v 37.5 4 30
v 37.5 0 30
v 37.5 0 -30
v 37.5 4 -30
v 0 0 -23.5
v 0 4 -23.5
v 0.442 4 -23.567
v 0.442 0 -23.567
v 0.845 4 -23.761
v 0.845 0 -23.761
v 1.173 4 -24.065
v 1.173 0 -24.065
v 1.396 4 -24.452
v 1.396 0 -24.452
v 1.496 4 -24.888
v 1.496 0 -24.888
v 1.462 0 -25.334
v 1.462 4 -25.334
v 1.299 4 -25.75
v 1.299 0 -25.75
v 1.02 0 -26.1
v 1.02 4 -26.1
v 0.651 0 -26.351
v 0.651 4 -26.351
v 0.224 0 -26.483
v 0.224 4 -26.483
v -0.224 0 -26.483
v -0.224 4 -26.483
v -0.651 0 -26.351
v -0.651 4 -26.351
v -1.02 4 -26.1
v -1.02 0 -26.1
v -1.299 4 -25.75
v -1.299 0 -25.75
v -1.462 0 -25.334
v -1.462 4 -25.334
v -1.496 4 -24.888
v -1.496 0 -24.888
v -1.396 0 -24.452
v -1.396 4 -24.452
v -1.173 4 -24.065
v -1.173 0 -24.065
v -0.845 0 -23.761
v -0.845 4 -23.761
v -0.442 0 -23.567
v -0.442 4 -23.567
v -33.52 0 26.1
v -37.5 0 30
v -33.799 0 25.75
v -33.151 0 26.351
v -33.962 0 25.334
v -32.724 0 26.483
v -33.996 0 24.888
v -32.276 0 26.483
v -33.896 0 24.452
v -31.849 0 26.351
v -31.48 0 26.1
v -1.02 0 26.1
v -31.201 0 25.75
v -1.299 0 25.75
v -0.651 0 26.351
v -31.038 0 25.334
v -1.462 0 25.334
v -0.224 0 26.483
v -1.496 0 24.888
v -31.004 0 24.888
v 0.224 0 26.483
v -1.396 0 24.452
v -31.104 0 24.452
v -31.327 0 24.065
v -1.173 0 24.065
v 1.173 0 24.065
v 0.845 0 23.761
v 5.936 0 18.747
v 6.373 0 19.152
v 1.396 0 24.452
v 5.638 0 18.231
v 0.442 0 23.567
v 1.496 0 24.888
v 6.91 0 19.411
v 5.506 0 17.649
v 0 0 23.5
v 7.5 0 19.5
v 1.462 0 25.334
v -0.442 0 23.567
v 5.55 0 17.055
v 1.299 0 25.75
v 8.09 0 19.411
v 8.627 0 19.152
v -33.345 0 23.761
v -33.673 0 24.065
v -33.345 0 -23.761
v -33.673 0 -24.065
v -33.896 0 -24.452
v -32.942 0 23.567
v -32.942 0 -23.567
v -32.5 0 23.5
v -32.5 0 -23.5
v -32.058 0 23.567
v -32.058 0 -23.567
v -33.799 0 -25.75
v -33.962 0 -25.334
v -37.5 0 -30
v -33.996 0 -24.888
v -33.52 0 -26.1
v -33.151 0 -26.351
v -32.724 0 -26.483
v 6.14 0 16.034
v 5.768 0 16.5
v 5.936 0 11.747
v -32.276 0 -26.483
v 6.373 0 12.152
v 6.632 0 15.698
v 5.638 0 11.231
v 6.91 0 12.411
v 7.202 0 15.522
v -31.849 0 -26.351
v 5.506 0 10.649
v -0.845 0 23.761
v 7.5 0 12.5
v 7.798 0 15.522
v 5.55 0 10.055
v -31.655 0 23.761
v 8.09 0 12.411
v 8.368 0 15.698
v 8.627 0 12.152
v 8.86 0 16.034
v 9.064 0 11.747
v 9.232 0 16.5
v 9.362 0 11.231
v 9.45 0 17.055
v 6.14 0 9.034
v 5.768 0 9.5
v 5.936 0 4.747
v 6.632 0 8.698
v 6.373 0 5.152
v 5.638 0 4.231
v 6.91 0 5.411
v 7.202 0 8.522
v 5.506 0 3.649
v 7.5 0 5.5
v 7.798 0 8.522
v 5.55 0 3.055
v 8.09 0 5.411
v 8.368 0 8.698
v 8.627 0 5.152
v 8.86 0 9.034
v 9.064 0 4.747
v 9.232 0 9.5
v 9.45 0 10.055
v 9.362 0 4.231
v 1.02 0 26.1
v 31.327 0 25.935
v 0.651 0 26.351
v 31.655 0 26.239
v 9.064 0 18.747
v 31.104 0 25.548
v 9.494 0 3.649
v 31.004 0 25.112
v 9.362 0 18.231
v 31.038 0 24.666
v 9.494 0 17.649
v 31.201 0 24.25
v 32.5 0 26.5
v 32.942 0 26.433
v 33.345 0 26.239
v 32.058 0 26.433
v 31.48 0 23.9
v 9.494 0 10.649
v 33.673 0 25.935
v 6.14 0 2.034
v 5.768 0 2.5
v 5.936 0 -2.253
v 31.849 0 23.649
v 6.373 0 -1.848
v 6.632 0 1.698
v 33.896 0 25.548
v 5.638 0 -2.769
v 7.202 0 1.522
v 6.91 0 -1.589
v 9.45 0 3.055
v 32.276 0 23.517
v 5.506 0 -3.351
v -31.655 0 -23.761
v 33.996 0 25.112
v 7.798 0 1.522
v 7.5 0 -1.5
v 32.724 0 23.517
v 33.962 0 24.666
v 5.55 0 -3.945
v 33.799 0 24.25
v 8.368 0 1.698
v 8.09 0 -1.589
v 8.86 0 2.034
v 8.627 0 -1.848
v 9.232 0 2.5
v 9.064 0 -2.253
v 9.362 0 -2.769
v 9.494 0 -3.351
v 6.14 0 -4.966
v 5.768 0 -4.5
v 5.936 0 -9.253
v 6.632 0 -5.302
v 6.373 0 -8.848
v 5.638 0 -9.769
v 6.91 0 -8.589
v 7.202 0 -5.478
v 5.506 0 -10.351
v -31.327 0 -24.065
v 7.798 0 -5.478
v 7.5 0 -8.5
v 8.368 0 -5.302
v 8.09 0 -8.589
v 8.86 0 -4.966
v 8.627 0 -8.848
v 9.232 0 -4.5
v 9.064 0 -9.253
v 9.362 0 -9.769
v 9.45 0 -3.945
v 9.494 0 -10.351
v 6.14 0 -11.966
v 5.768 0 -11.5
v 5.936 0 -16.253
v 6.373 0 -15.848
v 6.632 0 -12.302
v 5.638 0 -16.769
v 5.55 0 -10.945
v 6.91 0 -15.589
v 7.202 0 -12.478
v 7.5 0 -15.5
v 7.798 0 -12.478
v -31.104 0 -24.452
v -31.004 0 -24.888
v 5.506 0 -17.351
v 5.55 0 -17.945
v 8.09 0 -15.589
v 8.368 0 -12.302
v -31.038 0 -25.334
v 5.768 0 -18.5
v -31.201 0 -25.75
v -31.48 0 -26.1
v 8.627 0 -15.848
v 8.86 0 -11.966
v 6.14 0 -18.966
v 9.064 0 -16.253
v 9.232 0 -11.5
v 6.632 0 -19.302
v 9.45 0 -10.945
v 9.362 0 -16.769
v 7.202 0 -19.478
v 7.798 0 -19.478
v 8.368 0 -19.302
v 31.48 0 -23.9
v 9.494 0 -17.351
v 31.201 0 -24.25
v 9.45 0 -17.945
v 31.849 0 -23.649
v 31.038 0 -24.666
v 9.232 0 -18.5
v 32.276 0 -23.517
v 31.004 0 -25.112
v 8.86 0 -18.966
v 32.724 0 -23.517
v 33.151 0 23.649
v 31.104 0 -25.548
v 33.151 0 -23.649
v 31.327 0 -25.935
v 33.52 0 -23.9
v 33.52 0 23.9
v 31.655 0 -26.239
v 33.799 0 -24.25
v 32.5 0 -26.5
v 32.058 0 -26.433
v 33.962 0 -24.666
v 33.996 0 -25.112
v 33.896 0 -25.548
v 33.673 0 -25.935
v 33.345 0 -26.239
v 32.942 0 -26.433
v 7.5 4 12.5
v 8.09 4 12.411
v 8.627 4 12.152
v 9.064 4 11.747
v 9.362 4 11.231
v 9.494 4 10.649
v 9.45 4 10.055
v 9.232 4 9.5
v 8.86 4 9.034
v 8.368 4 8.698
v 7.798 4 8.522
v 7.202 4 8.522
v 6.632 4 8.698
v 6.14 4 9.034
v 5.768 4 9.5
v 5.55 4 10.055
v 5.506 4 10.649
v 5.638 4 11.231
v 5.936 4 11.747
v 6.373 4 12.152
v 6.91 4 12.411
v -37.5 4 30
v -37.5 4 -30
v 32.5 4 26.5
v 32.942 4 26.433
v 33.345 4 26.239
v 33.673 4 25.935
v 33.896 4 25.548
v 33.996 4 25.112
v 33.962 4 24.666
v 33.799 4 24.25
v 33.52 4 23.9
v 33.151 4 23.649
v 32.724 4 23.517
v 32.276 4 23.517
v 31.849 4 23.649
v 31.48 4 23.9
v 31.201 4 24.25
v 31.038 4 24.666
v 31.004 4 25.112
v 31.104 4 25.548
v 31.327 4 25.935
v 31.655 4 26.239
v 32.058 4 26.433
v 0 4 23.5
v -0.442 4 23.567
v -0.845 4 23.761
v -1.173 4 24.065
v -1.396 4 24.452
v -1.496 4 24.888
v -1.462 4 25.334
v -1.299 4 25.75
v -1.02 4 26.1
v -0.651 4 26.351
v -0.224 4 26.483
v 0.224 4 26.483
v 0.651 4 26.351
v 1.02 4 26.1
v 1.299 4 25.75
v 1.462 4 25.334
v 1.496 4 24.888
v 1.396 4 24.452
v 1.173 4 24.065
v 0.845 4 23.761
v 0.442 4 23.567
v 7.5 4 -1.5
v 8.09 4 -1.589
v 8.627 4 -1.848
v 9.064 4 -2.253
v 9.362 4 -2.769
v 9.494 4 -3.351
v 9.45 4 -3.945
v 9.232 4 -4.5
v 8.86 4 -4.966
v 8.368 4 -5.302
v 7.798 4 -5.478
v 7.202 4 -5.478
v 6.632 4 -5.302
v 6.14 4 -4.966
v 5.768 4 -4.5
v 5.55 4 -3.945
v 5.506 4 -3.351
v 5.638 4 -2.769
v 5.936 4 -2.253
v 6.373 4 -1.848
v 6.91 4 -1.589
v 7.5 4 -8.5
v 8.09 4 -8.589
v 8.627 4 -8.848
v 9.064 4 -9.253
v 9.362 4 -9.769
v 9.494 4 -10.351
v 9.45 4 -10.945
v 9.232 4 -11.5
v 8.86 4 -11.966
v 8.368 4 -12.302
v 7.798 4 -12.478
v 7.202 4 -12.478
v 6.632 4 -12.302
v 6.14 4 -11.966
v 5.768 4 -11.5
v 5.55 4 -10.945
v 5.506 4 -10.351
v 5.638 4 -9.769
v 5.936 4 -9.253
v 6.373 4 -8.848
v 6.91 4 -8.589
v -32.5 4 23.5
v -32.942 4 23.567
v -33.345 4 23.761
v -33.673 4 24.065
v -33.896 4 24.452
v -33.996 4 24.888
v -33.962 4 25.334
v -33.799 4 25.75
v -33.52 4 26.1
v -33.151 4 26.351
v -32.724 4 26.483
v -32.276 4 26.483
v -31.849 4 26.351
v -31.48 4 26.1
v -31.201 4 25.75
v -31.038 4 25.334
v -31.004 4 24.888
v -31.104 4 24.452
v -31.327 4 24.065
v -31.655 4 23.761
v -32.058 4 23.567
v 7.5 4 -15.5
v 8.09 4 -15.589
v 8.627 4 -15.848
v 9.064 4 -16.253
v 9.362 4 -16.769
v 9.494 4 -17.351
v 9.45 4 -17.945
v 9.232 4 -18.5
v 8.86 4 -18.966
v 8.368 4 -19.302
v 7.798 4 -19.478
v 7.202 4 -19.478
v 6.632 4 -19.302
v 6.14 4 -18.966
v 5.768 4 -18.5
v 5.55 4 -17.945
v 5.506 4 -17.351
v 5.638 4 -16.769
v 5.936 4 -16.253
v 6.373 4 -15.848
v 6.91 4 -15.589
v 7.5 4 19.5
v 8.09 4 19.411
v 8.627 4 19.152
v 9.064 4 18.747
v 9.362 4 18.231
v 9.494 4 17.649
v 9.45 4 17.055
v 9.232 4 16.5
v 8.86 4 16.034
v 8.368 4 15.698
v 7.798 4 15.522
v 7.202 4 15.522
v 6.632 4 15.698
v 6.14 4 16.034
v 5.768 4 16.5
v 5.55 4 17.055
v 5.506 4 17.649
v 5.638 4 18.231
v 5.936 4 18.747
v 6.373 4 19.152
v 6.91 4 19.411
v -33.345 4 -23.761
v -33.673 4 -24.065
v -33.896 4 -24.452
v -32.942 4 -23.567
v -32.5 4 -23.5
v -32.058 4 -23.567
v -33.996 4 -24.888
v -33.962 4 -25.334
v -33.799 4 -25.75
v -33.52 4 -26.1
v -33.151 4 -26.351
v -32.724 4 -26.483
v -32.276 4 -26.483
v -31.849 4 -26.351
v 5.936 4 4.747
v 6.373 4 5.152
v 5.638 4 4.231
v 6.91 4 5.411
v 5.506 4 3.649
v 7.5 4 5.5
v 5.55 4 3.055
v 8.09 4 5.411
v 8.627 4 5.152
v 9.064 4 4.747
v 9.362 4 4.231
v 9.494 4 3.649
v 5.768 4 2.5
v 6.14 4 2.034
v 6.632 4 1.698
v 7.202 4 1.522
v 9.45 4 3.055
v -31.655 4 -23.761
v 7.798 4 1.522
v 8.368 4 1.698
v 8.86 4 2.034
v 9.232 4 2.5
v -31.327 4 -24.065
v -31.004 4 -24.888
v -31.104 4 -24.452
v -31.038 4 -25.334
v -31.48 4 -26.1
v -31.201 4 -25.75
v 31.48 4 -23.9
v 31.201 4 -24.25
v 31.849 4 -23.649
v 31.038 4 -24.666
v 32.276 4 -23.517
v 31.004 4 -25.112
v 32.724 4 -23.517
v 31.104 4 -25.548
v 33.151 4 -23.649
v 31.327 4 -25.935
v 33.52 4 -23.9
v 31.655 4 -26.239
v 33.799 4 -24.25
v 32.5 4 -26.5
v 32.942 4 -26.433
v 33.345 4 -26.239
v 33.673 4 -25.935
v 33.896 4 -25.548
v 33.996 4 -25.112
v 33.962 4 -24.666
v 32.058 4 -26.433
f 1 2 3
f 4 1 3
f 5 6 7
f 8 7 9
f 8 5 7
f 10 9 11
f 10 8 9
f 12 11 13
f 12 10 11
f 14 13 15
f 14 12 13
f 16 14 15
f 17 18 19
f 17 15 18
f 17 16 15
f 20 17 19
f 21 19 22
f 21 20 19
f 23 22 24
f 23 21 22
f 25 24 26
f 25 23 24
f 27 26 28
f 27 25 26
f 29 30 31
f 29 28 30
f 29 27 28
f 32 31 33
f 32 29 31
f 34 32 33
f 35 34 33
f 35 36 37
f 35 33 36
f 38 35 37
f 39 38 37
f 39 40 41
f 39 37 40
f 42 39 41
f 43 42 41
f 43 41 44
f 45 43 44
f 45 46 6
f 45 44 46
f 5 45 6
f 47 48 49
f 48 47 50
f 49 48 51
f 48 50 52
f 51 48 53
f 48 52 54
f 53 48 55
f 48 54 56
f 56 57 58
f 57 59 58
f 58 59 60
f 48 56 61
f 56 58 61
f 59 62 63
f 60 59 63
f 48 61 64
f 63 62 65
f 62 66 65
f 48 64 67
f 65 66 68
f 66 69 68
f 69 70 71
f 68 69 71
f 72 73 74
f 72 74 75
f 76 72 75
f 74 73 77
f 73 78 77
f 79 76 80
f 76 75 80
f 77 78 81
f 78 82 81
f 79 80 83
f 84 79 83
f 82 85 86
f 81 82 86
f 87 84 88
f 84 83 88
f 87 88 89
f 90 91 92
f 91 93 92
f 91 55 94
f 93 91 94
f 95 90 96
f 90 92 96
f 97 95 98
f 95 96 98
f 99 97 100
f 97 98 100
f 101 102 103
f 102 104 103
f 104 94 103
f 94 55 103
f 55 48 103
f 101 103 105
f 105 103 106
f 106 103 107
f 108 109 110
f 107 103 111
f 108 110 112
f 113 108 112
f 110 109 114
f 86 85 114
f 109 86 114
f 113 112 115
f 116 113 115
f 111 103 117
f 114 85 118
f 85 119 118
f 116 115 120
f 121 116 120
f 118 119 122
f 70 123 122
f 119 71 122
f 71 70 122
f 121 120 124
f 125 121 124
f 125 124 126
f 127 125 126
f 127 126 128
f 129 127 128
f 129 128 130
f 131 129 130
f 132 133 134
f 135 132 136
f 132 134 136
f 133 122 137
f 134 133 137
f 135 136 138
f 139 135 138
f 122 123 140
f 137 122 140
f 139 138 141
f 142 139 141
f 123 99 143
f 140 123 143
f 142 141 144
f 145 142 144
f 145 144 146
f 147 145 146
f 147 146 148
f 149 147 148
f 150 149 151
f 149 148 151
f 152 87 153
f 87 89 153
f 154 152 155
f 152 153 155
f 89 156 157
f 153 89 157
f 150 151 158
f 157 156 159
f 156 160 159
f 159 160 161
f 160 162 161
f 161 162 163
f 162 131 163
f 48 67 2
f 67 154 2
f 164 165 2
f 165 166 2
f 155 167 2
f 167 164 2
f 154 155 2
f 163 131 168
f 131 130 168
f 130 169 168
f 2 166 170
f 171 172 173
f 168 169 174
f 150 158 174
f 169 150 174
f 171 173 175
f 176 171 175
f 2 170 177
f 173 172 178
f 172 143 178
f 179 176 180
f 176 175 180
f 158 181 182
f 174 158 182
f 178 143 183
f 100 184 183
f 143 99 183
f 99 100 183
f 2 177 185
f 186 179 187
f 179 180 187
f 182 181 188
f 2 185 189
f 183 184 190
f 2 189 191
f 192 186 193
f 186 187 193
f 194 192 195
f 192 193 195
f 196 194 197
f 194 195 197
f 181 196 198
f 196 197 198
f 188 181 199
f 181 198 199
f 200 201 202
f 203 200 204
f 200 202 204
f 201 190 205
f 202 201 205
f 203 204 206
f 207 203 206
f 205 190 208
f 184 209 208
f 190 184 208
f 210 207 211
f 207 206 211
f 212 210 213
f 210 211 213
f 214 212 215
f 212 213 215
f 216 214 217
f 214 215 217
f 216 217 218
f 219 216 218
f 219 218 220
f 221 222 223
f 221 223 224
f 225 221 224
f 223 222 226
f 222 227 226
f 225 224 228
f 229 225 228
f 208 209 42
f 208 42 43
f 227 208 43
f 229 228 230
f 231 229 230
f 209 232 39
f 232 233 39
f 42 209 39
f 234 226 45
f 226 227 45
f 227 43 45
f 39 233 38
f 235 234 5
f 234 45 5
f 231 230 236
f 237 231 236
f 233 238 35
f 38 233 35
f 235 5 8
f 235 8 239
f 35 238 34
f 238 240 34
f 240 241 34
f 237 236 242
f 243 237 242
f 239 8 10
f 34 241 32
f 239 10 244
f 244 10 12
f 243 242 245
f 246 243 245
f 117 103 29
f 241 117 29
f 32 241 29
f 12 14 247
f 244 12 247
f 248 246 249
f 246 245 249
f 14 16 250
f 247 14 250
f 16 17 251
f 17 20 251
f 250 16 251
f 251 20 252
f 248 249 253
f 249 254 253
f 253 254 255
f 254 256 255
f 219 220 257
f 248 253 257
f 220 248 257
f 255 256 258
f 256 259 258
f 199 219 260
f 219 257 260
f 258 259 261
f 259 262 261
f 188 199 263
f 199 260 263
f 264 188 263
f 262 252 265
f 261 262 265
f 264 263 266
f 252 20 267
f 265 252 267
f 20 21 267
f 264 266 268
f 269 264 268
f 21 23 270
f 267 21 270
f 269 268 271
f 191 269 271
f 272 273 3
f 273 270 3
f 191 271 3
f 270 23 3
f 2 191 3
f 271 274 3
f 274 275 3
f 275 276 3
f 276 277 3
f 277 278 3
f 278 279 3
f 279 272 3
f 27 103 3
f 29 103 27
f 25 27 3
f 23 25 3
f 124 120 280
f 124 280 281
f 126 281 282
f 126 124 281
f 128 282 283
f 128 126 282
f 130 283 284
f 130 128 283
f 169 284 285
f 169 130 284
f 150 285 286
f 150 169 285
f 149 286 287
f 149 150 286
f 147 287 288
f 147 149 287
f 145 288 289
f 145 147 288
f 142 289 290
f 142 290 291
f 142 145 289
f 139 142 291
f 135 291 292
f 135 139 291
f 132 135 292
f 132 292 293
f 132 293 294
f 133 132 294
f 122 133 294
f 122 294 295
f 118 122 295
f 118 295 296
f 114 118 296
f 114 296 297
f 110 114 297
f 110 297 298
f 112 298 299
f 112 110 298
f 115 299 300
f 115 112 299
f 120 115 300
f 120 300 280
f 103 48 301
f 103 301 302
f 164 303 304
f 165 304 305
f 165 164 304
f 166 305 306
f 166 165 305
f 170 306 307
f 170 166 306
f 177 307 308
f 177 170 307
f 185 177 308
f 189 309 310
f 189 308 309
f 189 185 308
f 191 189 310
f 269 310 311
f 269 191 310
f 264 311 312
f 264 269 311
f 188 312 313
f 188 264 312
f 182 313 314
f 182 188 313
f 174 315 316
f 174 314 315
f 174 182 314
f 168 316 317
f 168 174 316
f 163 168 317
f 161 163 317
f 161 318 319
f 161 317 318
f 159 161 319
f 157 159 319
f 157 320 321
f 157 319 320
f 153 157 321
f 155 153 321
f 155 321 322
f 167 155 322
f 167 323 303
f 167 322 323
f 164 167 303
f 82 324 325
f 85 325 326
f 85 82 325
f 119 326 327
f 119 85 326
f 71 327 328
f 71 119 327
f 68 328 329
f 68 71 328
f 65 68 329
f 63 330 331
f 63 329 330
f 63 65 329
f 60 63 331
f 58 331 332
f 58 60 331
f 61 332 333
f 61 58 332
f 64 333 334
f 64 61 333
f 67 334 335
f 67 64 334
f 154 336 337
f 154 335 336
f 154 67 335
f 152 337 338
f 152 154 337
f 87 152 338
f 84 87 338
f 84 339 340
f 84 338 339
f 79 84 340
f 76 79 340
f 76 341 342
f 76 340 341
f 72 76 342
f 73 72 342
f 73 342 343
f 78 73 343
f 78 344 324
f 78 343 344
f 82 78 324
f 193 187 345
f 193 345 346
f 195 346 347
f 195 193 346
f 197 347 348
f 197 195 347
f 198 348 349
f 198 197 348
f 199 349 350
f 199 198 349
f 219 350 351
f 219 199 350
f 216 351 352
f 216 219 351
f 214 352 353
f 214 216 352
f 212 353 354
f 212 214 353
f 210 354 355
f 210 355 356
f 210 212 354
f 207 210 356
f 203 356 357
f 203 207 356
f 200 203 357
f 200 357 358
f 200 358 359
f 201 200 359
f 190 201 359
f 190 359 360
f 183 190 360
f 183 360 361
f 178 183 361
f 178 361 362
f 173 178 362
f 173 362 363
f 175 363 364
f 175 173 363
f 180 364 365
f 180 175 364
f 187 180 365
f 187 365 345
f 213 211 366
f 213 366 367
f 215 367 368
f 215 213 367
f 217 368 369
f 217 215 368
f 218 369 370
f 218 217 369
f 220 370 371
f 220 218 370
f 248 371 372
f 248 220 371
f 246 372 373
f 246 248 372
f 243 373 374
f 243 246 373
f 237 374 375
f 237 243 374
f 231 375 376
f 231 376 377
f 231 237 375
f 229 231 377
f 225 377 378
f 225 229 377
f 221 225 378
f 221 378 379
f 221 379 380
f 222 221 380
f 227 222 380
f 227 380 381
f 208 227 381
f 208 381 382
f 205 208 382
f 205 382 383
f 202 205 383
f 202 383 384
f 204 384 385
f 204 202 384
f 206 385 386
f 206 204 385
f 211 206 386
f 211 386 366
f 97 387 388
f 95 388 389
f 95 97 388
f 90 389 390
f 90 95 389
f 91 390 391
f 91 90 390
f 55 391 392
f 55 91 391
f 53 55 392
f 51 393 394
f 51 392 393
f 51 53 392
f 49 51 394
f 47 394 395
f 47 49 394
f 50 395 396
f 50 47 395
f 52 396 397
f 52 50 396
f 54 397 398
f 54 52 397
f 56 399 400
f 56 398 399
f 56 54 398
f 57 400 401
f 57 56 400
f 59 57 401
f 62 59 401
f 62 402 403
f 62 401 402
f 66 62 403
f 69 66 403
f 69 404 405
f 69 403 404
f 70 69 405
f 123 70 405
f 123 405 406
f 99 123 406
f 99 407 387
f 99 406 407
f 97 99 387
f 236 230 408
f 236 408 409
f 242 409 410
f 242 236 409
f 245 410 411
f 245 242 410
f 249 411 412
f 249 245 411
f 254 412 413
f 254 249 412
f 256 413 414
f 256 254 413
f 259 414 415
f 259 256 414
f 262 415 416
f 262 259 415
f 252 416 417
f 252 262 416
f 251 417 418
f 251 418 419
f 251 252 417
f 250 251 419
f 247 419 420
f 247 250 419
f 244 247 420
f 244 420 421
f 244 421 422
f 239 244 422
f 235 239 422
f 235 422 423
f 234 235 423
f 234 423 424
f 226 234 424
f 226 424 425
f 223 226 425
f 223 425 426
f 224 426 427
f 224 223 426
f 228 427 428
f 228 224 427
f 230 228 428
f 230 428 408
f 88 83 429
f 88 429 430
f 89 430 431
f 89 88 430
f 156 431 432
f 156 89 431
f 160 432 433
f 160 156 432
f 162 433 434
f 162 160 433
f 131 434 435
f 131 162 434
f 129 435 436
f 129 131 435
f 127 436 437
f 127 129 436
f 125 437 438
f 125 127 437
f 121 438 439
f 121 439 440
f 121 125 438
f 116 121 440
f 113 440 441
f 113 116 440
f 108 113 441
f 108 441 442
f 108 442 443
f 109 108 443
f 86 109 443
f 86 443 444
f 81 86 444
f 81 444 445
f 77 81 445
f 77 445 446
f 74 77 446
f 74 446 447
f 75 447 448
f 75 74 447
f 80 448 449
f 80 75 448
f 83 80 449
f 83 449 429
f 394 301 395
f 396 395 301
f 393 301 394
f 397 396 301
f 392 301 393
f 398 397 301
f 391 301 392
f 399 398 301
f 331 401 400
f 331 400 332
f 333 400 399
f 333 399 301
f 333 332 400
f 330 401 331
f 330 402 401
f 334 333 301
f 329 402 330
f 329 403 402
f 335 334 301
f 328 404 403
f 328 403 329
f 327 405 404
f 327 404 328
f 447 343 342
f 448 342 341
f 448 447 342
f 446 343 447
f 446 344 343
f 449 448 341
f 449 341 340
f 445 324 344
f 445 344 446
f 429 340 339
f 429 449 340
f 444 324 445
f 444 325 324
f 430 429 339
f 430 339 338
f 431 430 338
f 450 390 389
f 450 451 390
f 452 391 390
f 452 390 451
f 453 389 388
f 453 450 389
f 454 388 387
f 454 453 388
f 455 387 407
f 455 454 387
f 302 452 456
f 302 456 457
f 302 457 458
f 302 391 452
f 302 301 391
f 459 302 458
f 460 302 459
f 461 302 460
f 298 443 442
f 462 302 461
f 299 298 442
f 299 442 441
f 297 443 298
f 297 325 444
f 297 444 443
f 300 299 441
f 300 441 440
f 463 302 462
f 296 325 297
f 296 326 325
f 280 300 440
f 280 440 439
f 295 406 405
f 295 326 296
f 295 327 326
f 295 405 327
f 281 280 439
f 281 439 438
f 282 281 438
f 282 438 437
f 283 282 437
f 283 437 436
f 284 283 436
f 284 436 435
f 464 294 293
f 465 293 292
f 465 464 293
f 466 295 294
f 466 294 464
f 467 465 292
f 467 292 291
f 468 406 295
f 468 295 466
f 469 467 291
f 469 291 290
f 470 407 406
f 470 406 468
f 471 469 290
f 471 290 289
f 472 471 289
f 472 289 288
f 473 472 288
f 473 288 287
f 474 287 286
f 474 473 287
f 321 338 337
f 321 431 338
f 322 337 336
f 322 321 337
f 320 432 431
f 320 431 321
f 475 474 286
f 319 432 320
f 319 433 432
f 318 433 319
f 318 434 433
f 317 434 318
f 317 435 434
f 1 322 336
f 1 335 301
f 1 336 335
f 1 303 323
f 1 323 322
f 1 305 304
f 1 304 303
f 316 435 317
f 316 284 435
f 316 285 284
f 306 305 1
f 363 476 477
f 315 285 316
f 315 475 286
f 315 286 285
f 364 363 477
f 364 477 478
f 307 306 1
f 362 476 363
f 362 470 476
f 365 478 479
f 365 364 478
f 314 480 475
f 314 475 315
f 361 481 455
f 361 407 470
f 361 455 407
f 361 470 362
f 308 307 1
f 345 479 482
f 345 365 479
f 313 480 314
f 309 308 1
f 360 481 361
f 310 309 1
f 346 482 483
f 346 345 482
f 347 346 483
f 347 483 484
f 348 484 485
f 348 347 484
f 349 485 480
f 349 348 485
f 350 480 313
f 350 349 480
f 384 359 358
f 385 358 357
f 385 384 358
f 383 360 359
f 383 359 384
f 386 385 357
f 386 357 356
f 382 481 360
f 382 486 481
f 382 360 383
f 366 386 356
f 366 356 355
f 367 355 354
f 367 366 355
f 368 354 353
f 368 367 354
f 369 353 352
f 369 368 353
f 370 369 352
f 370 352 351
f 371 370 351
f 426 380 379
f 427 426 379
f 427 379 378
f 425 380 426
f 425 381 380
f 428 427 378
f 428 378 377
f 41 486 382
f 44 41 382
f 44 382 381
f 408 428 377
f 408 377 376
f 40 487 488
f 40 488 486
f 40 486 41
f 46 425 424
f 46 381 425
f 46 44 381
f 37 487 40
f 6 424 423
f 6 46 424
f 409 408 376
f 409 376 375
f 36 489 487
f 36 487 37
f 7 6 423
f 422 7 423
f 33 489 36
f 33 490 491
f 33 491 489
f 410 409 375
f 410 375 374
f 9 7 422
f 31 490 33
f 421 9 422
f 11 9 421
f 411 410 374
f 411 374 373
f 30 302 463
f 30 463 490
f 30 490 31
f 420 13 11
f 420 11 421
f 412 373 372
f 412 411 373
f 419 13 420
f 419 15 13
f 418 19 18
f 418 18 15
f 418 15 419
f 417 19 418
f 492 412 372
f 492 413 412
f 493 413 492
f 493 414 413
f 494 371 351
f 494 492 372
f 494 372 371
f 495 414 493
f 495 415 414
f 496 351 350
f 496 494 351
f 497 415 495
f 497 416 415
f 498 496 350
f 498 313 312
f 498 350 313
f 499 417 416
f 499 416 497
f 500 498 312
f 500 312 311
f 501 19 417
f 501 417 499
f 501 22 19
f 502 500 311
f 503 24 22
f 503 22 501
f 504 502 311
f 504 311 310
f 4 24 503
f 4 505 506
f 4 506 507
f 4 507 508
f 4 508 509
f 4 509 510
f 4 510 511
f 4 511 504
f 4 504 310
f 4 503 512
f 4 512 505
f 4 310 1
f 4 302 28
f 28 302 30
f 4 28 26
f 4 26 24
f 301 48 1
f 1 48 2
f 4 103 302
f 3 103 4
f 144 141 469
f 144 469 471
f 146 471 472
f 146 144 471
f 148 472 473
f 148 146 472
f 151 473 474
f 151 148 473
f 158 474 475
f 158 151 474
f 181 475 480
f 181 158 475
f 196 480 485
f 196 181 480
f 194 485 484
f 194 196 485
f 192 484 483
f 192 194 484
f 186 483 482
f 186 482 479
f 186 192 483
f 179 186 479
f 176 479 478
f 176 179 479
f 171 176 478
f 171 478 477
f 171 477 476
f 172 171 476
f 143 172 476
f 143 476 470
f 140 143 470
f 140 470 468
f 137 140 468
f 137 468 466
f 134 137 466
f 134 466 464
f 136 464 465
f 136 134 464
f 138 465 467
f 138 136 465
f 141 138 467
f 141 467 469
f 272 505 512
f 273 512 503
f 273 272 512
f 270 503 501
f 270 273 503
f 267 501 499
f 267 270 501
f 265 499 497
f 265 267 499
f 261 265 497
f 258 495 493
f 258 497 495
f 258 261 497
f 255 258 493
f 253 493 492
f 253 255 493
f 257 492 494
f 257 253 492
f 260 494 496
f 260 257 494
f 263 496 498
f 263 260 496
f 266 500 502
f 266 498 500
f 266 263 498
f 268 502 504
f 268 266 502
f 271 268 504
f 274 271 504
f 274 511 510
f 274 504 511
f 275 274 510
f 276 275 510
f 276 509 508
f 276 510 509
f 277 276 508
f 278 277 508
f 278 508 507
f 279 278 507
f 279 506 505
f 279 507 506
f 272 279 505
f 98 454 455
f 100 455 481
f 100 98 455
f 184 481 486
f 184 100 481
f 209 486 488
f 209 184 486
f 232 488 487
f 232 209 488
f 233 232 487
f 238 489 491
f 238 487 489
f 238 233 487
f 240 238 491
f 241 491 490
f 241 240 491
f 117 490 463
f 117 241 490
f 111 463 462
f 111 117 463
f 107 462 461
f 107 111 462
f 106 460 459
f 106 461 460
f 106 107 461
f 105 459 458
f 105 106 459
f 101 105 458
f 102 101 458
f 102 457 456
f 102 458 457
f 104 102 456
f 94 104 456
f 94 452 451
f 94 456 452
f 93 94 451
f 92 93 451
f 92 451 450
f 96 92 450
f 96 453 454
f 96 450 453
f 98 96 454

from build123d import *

# Parameters (mm, degrees)
SKETCH_1_W          = 75
SKETCH_1_H          = 60
EXTRUDE_1_DEPTH     = 4
SKETCH_2_R          = 2
CUT_EXTRUDE_1_DEPTH = 4
SKETCH_3_R          = 1.5
CUT_EXTRUDE_2_DEPTH = 49.189729196


with BuildPart() as part:
    # 草图1 → 凸台-拉伸1 (new body)
    with BuildSketch(Plane(origin=(0, 0, 0), x_dir=(1, 0, 0), z_dir=(0, 1, 0))):
        Rectangle(SKETCH_1_W, SKETCH_1_H)
    extrude(amount=EXTRUDE_1_DEPTH)

    # 草图2 → 切除-拉伸1 (cut)
    with BuildSketch(Plane(origin=(0, 0, 0), x_dir=(1, 0, 0), z_dir=(0, 1, 0))):
        with Locations(Location((7.5, 17.5, 0), (0, 0, 270))):
            Circle(SKETCH_2_R)
        with Locations(Location((7.5, 10.5, 0), (0, 0, 270))):
            Circle(SKETCH_2_R)
        with Locations(Location((7.5, 3.5, 0), (0, 0, 270))):
            Circle(SKETCH_2_R)
        with Locations(Location((7.5, -3.5, 0), (0, 0, 270))):
            Circle(SKETCH_2_R)
        with Locations(Location((7.5, -10.5, 0), (0, 0, 270))):
            Circle(SKETCH_2_R)
        with Locations(Location((7.5, -17.5, 0), (0, 0, 270))):
            Circle(SKETCH_2_R)
    extrude(amount=CUT_EXTRUDE_1_DEPTH, mode=Mode.SUBTRACT)

    # 草图3 → 切除-拉伸2 (cut, through all)
    with BuildSketch(Plane(origin=(0, 0, 0), x_dir=(1, 0, 0), z_dir=(0, 1, 0))):
        with Locations(Location((-32.5, 25, 0), (0, 0, 270))):
            Circle(SKETCH_3_R)
        with Locations(Location((32.5, 25, 0), (0, 0, 90))):
            Circle(SKETCH_3_R)
        with Locations(Location((32.5, -25, 0), (0, 0, 270))):
            Circle(SKETCH_3_R)
        with Locations(Location((-32.5, -25, 0), (0, 0, 90))):
            Circle(SKETCH_3_R)
        with Locations(Location((0, -25, 0), (0, 0, 90))):
            Circle(SKETCH_3_R)
        with Locations(Location((0, 25, 0), (0, 0, 270))):
            Circle(SKETCH_3_R)
    extrude(amount=CUT_EXTRUDE_2_DEPTH, mode=Mode.SUBTRACT)


solid = part.part
